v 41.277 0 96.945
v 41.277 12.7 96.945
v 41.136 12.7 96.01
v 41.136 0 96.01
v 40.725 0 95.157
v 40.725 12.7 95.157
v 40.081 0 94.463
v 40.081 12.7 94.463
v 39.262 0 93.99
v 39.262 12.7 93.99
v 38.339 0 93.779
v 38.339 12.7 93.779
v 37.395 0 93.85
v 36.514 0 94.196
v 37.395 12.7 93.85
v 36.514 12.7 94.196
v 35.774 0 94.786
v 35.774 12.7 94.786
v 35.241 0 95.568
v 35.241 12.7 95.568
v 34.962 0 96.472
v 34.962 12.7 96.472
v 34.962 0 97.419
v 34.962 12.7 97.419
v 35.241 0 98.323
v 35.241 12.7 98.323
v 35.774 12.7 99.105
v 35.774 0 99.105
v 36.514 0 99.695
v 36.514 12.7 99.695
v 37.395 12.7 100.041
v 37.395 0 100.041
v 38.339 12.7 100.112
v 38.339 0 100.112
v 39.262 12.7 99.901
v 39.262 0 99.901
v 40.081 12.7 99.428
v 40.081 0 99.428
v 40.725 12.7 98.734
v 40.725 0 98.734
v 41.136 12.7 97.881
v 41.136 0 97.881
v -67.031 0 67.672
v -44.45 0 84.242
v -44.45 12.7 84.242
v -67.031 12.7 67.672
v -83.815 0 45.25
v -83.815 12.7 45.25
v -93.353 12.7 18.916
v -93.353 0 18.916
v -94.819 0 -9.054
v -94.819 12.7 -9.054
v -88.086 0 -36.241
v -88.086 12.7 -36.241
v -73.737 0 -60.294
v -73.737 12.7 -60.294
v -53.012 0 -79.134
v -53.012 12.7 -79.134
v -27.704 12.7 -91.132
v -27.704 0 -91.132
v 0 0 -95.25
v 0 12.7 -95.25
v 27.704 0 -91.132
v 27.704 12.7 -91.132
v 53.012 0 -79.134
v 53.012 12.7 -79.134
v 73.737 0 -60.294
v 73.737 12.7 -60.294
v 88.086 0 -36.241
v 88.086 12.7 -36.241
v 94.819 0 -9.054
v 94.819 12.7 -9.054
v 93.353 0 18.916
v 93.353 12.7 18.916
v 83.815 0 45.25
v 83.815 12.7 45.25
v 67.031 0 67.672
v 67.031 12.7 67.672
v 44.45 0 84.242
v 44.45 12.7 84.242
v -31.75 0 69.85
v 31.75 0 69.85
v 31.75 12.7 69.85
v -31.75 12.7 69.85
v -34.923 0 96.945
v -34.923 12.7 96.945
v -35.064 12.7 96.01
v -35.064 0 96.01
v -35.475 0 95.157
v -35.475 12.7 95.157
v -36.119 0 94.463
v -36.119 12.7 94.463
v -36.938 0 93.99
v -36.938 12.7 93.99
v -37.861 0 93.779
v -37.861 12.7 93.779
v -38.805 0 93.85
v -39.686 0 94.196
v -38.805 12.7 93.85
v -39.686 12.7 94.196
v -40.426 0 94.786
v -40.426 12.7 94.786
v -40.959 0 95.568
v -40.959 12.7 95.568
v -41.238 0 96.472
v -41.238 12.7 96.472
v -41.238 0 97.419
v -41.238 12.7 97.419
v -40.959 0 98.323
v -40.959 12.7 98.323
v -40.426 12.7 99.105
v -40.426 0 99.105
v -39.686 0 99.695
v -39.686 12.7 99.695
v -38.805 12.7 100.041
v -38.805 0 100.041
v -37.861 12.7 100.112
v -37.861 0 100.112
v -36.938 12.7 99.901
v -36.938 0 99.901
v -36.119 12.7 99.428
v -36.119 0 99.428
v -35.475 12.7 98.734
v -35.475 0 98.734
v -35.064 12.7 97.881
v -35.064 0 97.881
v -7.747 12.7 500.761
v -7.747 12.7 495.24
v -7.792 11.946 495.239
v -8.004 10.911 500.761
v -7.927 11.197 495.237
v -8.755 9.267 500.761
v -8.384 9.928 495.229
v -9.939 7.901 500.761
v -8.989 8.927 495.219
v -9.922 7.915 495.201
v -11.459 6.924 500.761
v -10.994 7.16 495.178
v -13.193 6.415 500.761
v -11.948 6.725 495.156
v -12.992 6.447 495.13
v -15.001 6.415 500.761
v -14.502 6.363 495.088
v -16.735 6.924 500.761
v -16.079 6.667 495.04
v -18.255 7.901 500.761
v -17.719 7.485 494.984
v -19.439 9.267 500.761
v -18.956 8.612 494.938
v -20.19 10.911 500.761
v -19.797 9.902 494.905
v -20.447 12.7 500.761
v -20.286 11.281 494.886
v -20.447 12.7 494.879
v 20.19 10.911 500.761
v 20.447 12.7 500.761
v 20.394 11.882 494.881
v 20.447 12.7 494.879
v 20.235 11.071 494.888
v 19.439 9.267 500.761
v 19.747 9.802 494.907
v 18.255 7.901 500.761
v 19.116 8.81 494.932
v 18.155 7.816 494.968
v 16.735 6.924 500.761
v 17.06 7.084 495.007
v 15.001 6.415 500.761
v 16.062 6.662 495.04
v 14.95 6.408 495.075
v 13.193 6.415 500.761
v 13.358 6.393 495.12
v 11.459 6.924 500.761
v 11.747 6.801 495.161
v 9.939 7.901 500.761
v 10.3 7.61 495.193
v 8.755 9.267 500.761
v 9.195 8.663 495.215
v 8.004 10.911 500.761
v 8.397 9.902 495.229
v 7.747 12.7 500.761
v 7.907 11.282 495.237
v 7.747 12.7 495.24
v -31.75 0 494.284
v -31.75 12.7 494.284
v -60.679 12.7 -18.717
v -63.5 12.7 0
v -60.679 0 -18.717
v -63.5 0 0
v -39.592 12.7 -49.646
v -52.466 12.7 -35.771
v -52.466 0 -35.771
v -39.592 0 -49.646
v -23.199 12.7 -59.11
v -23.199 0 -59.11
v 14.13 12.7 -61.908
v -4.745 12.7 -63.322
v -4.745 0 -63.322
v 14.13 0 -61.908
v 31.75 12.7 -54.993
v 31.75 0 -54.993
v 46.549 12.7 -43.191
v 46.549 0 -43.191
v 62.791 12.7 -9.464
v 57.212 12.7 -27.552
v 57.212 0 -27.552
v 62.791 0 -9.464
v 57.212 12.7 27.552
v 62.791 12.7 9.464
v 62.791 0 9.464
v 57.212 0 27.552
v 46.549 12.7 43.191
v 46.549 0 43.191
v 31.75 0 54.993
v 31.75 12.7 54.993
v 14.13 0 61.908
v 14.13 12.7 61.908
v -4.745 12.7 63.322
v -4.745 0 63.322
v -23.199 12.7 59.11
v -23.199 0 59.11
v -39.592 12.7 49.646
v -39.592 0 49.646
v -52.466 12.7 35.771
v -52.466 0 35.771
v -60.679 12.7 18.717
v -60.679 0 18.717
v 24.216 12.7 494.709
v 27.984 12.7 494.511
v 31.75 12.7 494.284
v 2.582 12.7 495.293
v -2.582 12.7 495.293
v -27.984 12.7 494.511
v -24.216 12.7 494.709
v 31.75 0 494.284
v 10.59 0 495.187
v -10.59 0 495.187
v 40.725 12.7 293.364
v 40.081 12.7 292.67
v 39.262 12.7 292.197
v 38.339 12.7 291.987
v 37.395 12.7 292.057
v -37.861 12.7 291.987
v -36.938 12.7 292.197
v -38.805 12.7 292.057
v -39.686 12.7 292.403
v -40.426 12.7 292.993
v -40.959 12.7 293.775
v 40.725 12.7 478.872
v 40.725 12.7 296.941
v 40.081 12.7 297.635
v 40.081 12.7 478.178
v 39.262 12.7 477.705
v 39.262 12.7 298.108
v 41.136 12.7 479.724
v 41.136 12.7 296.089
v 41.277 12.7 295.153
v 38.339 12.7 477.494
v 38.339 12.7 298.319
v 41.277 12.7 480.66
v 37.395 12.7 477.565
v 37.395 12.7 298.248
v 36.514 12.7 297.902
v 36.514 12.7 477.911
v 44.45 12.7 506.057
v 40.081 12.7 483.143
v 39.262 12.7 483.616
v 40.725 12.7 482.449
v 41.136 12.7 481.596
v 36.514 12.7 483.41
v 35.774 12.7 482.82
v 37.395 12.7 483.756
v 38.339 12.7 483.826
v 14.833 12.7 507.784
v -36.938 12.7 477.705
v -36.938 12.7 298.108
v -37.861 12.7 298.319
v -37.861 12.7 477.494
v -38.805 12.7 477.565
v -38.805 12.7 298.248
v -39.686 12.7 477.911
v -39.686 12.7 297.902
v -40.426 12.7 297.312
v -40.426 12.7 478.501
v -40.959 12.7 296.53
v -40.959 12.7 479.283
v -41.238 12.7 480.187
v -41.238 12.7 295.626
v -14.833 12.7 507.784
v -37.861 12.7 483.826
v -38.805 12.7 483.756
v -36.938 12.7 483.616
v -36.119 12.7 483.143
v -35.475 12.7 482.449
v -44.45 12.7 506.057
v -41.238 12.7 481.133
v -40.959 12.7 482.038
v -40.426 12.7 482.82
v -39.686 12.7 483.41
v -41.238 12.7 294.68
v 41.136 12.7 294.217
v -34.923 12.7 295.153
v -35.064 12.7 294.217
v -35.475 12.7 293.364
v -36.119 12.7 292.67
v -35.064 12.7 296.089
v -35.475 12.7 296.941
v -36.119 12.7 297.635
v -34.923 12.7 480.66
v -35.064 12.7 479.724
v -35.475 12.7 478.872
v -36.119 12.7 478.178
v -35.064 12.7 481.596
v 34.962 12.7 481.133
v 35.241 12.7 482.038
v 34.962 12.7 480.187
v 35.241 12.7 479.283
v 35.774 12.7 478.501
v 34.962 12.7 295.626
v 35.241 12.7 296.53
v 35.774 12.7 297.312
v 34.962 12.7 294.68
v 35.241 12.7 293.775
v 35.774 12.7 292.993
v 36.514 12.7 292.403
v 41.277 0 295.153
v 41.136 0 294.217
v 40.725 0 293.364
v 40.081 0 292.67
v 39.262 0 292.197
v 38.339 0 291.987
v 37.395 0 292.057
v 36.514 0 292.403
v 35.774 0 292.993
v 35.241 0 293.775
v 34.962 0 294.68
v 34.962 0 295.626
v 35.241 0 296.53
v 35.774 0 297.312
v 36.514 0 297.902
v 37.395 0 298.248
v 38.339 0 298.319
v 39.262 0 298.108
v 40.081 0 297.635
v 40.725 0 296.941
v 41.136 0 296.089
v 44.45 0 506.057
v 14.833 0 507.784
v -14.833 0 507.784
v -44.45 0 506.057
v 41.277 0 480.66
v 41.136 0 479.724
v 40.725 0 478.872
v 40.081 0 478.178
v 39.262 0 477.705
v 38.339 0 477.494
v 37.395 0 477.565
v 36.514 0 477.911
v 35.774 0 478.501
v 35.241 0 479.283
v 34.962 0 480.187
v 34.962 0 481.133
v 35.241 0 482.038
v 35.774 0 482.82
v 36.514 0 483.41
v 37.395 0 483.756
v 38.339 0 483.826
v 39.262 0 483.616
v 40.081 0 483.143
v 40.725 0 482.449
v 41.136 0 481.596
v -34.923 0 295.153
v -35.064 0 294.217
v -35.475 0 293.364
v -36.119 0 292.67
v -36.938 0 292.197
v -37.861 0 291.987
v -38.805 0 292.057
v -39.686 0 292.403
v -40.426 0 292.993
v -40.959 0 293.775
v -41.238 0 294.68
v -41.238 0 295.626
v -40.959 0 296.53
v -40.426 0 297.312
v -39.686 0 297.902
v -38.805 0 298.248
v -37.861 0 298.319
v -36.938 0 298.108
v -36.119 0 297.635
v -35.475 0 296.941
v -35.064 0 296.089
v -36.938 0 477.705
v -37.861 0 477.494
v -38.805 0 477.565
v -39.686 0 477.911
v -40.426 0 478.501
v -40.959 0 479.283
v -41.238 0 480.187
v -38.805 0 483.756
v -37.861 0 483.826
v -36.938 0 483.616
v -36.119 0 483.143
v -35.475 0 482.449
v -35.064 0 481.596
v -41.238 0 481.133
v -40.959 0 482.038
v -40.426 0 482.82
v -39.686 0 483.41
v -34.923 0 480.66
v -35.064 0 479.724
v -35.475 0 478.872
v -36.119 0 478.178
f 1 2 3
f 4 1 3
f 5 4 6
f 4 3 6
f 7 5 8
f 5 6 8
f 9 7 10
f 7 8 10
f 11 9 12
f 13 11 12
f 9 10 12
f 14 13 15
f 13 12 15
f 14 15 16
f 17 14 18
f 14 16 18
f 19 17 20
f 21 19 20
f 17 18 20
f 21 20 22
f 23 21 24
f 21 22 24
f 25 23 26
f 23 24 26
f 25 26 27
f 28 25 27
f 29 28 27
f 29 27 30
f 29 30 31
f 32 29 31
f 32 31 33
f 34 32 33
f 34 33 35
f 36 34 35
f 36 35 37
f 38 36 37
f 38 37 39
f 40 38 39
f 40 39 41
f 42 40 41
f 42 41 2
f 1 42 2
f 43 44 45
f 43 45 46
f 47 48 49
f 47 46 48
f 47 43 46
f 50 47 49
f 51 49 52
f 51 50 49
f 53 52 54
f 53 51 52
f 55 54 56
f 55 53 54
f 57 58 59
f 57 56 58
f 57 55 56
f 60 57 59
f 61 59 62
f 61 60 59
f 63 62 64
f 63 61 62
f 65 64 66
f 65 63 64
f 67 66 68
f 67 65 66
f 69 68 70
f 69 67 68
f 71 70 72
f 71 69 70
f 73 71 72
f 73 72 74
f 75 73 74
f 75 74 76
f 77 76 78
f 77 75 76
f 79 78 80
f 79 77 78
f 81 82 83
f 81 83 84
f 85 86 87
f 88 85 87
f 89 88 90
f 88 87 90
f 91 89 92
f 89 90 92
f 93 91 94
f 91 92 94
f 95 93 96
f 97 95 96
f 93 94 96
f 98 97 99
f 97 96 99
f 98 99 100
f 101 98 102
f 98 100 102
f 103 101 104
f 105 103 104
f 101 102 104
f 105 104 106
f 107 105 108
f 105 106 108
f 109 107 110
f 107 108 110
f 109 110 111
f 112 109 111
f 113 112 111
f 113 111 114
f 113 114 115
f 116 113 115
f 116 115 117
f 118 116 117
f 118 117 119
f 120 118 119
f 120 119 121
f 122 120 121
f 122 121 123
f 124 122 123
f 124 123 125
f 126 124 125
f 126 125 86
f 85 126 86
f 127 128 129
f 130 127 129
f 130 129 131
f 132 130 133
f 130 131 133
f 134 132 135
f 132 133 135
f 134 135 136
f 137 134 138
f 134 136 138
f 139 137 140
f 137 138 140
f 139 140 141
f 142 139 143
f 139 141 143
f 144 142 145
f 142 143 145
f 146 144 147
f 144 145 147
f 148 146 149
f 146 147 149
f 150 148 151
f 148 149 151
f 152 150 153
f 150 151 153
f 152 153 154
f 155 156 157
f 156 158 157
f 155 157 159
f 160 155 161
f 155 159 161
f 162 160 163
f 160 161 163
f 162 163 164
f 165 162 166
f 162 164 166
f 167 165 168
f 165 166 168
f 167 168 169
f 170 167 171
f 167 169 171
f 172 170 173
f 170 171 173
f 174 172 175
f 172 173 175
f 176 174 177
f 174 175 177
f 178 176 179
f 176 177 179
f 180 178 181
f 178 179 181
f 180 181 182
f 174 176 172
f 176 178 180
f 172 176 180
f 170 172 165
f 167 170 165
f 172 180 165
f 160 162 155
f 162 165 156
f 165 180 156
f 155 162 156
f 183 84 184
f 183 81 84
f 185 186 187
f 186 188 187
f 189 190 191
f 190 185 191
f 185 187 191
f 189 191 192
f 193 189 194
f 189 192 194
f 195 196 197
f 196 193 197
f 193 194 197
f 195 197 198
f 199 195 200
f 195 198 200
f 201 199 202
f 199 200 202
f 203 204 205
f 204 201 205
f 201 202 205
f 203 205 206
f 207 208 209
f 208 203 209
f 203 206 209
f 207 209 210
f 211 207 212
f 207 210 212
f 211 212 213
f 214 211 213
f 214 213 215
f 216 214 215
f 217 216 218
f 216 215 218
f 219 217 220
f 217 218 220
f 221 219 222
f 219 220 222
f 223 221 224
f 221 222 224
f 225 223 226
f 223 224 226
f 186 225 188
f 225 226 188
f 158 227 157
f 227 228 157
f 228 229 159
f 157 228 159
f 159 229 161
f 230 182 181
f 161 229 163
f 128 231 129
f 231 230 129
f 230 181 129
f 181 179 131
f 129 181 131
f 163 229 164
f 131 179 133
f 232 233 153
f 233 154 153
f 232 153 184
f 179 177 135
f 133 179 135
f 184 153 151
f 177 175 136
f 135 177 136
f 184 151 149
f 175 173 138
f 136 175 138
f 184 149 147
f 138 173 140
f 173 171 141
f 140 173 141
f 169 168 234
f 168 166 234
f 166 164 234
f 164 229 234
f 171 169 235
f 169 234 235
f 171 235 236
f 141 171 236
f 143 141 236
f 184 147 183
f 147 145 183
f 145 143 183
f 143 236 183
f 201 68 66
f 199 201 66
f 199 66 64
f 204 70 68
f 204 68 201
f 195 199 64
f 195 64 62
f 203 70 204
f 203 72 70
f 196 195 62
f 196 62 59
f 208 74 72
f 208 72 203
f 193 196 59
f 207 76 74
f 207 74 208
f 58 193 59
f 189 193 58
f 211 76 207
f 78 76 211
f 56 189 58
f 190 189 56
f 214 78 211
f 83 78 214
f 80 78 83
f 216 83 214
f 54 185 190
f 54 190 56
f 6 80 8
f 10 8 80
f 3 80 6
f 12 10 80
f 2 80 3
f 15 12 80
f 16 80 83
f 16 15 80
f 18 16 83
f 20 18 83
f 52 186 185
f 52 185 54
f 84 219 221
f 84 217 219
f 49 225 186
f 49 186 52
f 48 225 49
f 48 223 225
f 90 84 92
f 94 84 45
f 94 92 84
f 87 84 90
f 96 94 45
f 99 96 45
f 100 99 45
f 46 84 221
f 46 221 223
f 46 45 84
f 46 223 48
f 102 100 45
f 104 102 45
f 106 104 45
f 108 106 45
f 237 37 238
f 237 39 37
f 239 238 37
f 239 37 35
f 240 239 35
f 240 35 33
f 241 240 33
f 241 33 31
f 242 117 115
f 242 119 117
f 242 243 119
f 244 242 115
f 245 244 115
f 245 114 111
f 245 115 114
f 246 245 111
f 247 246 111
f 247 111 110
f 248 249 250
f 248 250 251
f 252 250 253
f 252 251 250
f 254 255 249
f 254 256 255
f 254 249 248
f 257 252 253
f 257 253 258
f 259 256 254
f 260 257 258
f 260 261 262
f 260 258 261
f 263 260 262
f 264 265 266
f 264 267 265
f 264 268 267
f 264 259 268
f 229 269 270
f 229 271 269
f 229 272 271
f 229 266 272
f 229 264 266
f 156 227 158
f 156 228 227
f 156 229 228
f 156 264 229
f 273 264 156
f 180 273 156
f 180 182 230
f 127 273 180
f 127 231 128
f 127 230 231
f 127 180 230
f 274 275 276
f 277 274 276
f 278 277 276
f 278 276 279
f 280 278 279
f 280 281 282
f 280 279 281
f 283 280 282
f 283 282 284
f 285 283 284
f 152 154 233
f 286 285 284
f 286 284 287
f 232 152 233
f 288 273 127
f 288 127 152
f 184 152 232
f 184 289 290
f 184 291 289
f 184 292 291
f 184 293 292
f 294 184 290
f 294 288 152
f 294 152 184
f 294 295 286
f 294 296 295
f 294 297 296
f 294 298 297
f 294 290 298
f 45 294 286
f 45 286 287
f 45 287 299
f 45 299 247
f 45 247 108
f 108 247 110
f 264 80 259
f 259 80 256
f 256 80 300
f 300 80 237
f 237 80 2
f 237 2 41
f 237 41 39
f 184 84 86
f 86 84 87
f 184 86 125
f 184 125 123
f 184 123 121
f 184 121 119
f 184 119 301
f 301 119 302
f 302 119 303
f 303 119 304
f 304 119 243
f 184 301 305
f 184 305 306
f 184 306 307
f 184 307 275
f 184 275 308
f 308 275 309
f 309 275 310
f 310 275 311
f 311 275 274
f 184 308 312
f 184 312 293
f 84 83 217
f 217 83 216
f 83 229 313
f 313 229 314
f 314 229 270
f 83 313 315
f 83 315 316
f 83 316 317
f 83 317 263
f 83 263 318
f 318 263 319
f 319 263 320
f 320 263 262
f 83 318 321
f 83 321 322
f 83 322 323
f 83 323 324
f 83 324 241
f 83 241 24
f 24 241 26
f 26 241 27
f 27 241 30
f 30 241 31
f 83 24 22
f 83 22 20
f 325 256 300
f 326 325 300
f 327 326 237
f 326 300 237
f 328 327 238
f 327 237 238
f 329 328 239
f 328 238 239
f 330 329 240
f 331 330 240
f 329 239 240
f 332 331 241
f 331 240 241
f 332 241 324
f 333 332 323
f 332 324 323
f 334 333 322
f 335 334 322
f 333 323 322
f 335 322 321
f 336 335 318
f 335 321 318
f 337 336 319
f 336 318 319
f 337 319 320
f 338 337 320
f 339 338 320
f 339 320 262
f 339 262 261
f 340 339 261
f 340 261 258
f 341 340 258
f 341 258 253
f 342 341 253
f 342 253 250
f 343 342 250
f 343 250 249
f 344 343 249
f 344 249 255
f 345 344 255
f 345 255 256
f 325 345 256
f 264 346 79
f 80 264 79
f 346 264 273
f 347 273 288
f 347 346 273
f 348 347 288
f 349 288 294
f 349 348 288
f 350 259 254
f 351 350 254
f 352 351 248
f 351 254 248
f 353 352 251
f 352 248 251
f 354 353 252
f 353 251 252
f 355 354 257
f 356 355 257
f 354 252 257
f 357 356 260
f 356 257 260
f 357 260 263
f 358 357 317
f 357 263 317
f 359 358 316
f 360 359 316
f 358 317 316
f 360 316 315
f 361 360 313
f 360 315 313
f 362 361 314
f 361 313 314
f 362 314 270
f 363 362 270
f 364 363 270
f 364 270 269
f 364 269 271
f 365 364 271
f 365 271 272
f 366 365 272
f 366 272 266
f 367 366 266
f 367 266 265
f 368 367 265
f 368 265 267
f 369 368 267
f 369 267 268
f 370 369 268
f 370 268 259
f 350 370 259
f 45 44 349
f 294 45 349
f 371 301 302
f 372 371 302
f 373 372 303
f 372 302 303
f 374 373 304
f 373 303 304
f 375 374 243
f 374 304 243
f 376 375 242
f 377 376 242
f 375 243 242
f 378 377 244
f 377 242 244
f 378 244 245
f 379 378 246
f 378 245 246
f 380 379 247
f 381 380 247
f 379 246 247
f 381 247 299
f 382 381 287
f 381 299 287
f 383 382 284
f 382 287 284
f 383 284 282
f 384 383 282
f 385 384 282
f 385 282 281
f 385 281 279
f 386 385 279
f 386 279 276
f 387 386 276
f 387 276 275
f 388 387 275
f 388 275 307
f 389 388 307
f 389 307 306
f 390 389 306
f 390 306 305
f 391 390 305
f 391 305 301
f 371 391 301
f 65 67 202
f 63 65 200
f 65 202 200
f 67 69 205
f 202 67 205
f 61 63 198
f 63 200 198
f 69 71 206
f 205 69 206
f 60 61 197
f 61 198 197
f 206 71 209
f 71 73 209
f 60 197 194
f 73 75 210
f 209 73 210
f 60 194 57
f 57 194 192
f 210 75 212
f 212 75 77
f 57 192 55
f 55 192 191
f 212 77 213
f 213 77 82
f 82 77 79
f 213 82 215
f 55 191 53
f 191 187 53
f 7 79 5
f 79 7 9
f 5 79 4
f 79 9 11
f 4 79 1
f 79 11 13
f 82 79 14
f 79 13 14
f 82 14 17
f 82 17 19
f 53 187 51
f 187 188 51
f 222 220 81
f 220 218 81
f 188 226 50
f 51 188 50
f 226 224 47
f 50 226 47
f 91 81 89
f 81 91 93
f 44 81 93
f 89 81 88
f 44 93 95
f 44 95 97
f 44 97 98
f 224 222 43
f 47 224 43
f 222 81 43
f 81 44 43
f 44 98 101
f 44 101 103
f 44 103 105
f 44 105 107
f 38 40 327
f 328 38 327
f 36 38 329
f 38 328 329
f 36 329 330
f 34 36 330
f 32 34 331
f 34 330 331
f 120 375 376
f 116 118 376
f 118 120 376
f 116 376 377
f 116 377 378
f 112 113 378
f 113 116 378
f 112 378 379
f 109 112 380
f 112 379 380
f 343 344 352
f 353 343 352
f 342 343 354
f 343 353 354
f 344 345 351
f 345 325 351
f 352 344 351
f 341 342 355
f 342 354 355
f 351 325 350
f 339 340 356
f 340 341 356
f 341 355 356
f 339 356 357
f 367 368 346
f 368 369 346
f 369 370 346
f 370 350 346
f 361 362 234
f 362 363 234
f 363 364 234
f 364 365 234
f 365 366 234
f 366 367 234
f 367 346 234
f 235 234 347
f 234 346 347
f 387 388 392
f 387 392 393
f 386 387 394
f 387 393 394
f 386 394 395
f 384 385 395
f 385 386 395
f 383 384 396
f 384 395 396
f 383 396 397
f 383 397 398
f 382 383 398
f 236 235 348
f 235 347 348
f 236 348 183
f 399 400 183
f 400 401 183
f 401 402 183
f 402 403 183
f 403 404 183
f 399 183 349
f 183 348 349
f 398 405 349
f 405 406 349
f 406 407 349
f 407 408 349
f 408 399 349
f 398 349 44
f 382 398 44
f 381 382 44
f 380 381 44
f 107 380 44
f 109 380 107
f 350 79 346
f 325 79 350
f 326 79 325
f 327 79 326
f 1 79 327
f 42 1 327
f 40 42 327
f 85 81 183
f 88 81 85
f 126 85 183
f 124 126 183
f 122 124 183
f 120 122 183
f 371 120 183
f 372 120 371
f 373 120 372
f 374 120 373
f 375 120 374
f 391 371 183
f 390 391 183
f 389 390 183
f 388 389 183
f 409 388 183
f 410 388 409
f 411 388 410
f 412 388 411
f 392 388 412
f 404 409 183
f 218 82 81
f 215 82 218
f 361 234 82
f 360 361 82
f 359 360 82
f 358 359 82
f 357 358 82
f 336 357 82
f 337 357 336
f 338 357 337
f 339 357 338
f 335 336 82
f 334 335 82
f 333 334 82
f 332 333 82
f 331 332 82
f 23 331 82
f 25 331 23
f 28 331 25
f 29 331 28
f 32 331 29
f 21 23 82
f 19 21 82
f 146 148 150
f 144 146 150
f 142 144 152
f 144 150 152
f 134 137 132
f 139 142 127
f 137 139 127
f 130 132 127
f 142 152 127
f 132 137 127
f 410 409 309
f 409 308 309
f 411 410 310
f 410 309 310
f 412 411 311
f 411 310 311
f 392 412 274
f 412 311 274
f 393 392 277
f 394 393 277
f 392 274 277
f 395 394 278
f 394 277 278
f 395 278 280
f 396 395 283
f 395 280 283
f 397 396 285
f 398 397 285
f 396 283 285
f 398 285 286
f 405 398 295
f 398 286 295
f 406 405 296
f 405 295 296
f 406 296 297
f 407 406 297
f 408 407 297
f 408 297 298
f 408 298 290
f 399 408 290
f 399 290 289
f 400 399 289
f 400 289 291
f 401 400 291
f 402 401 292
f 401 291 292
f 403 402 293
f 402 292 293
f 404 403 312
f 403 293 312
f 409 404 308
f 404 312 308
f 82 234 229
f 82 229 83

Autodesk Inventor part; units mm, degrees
ref_plane "YZ Plane" through (0, 0, 0) normal (1, 0, 0) x (0, 1, 0)
ref_plane "XZ Plane" through (0, 0, 0) normal (0, 1, 0) x (-1, 0, 0)
sketch "Sketch2" plane through (0, 0, 0) normal (0, 1, 0) x (-1, 0, 0)
  arc A0 (44.45, 506.057) -> (-44.45, 506.057) centre (0, -1.4242) ccw construction
  arc A1 (44.45, 506.057) -> (-44.45, 506.057) centre (0, -1.4242) ccw
  line L0 (44.45, 84.2423) -> (44.45, 506.057)
  line L1 (-44.45, 506.057) -> (-44.45, 84.2423)
  circle A2 centre (0, 0) radius 57.15 construction
  circle A3 centre (0, 0) radius 63.5
  arc A4 (-44.45, 84.2423) -> (44.45, 84.2423) centre (0, 0) ccw
  line L2 (0, 0) -> (0, 508) construction
  arc A5 (31.75, 494.2843) -> (-31.75, 494.2843) centre (0, -1.4242) ccw
  line L3 (-31.75, 494.2843) -> (-31.75, 69.85)
  arc A6 (-31.75, 77.0401) -> (31.75, 77.0401) centre (0, 0) ccw construction
  line L4 (31.75, 69.85) -> (31.75, 494.2843)
  arc A7 (31.75, 62.217) -> (-31.75, 62.217) centre (0, 0) ccw construction
  line L5 (0, 69.85) -> (0, 63.5) construction
  line L6 (-31.75, 69.85) -> (31.75, 69.85)
  point P0 (-7.0927, 251.5509)
  dimension "d23" = 127
  dimension "d21" = 88.9
  dimension "d22" = 114.3
  dimension "d24" = 190.5
  dimension "d25" = 508
  dimension "d26" = 88.9
  dimension "d29" = 12.7
  dimension "d31" = 139.7
  dimension "d69" = 12.7
  dimension "d70" = 12.7
extrude "Extrusion2" add sketch "Sketch2" along normal blind 12.7
sketch "Sketch3" plane through (0, 12.7, 0) normal (0, 1, 0) x (1, 0, 0)
  arc A0 (-44.4483, -506.0602) -> (44.4517, -506.0602) centre (0.0017, 1.4211) ccw construction
  line L0 (44.4517, -506.0602) -> (44.4517, -84.2454) construction
  line L1 (-44.4483, -506.0602) -> (44.4517, -506.0602) construction
  line L2 (44.4517, -506.0602) -> (44.4517, -84.2454) construction
  line L3 (44.4517, -84.2454) -> (-44.4483, -84.2454) construction
  line L4 (-44.4483, -84.2454) -> (-44.4483, -506.0602) construction
  line L5 (-44.4483, -84.2454) -> (-44.4483, -506.0602) construction
  line L6 (-44.4483, -295.1528) -> (-38.0983, -295.1528) construction
  line L7 (-38.0983, -295.1528) -> (-38.0983, -506.0602) construction
  line L8 (-38.0983, -295.1528) -> (-38.0983, -84.2454) construction
  circle A1 centre (-38.0983, -96.9454) radius 3.175
  circle A2 centre (-38.0983, -480.6602) radius 3.175
  circle A3 centre (-38.0983, -295.1528) radius 3.175
  line L9 (0.0017, -506.0602) -> (0.0017, 1.4211) construction
  circle A4 centre (38.1017, -295.1528) radius 3.175
  line L10 (44.4517, -295.1528) -> (38.1017, -295.1528) construction
  circle A5 centre (38.1017, -96.9454) radius 3.175
  circle A6 centre (38.1017, -480.6602) radius 3.175
  line L11 (38.1017, -295.1528) -> (38.1017, -506.0602) construction
  line L12 (38.1017, -295.1528) -> (38.1017, -84.2454) construction
  line L13 (44.4517, -84.2454) -> (44.4517, -506.0602) construction
  line L14 (44.4517, -84.2454) -> (44.4517, -506.0602) construction
  point P0 (0, 0)
  dimension "d54" = 6.35
  dimension "d55" = 90
  dimension "d56" = 6.35
  dimension "d57" = 12.7
  dimension "d58" = 6.35
  dimension "d59" = 6.35
  dimension "d60" = 25.4
extrude "Extrusion3" cut sketch "Sketch3" against normal blind 12.7
ref_plane "Work Plane2" through (0, 0, 494.411) normal (0, 0, 1) x (1, 0, 0)
sketch "Sketch5" plane through (0, 0, 494.411) normal (0, 0, 1) x (1, 0, 0)
  line L0 (-28.194, 25.4) -> (-28.194, 12.7) construction
  line L1 (-28.194, 25.4) -> (-15.494, 25.4) construction
  line L2 (-28.194, 12.7) -> (28.194, 12.7) construction
  line L3 (0, 12.7) -> (-28.194, 12.7) construction
  circle A0 centre (-14.097, 12.7) radius 6.35
  line L4 (0, 12.7) -> (0, 25.4) construction
  circle A1 centre (14.097, 12.7) radius 6.35
  line L5 (95.25, 12.7) -> (-95.25, 12.7) construction
  line L6 (95.25, 12.7) -> (-95.25, 12.7) construction
  line L7 (0, 12.7) -> (0, 0) construction
  line L8 (95.25, 0) -> (-95.25, 0) construction
  point P0 (44.45, 12.7)
  point P1 (44.45, 0)
  point P2 (-44.45, 0)
  dimension "d62" = 12.7
  dimension "d63" = 90
  dimension "d64" = 56.388
  dimension "d65" = 90
  dimension "d66" = 12.7
extrude "Extrusion5" cut sketch "Sketch5" along normal blind 6.35
equation "\"d26\" = d21"
properties part number "Arm Layer 2"
